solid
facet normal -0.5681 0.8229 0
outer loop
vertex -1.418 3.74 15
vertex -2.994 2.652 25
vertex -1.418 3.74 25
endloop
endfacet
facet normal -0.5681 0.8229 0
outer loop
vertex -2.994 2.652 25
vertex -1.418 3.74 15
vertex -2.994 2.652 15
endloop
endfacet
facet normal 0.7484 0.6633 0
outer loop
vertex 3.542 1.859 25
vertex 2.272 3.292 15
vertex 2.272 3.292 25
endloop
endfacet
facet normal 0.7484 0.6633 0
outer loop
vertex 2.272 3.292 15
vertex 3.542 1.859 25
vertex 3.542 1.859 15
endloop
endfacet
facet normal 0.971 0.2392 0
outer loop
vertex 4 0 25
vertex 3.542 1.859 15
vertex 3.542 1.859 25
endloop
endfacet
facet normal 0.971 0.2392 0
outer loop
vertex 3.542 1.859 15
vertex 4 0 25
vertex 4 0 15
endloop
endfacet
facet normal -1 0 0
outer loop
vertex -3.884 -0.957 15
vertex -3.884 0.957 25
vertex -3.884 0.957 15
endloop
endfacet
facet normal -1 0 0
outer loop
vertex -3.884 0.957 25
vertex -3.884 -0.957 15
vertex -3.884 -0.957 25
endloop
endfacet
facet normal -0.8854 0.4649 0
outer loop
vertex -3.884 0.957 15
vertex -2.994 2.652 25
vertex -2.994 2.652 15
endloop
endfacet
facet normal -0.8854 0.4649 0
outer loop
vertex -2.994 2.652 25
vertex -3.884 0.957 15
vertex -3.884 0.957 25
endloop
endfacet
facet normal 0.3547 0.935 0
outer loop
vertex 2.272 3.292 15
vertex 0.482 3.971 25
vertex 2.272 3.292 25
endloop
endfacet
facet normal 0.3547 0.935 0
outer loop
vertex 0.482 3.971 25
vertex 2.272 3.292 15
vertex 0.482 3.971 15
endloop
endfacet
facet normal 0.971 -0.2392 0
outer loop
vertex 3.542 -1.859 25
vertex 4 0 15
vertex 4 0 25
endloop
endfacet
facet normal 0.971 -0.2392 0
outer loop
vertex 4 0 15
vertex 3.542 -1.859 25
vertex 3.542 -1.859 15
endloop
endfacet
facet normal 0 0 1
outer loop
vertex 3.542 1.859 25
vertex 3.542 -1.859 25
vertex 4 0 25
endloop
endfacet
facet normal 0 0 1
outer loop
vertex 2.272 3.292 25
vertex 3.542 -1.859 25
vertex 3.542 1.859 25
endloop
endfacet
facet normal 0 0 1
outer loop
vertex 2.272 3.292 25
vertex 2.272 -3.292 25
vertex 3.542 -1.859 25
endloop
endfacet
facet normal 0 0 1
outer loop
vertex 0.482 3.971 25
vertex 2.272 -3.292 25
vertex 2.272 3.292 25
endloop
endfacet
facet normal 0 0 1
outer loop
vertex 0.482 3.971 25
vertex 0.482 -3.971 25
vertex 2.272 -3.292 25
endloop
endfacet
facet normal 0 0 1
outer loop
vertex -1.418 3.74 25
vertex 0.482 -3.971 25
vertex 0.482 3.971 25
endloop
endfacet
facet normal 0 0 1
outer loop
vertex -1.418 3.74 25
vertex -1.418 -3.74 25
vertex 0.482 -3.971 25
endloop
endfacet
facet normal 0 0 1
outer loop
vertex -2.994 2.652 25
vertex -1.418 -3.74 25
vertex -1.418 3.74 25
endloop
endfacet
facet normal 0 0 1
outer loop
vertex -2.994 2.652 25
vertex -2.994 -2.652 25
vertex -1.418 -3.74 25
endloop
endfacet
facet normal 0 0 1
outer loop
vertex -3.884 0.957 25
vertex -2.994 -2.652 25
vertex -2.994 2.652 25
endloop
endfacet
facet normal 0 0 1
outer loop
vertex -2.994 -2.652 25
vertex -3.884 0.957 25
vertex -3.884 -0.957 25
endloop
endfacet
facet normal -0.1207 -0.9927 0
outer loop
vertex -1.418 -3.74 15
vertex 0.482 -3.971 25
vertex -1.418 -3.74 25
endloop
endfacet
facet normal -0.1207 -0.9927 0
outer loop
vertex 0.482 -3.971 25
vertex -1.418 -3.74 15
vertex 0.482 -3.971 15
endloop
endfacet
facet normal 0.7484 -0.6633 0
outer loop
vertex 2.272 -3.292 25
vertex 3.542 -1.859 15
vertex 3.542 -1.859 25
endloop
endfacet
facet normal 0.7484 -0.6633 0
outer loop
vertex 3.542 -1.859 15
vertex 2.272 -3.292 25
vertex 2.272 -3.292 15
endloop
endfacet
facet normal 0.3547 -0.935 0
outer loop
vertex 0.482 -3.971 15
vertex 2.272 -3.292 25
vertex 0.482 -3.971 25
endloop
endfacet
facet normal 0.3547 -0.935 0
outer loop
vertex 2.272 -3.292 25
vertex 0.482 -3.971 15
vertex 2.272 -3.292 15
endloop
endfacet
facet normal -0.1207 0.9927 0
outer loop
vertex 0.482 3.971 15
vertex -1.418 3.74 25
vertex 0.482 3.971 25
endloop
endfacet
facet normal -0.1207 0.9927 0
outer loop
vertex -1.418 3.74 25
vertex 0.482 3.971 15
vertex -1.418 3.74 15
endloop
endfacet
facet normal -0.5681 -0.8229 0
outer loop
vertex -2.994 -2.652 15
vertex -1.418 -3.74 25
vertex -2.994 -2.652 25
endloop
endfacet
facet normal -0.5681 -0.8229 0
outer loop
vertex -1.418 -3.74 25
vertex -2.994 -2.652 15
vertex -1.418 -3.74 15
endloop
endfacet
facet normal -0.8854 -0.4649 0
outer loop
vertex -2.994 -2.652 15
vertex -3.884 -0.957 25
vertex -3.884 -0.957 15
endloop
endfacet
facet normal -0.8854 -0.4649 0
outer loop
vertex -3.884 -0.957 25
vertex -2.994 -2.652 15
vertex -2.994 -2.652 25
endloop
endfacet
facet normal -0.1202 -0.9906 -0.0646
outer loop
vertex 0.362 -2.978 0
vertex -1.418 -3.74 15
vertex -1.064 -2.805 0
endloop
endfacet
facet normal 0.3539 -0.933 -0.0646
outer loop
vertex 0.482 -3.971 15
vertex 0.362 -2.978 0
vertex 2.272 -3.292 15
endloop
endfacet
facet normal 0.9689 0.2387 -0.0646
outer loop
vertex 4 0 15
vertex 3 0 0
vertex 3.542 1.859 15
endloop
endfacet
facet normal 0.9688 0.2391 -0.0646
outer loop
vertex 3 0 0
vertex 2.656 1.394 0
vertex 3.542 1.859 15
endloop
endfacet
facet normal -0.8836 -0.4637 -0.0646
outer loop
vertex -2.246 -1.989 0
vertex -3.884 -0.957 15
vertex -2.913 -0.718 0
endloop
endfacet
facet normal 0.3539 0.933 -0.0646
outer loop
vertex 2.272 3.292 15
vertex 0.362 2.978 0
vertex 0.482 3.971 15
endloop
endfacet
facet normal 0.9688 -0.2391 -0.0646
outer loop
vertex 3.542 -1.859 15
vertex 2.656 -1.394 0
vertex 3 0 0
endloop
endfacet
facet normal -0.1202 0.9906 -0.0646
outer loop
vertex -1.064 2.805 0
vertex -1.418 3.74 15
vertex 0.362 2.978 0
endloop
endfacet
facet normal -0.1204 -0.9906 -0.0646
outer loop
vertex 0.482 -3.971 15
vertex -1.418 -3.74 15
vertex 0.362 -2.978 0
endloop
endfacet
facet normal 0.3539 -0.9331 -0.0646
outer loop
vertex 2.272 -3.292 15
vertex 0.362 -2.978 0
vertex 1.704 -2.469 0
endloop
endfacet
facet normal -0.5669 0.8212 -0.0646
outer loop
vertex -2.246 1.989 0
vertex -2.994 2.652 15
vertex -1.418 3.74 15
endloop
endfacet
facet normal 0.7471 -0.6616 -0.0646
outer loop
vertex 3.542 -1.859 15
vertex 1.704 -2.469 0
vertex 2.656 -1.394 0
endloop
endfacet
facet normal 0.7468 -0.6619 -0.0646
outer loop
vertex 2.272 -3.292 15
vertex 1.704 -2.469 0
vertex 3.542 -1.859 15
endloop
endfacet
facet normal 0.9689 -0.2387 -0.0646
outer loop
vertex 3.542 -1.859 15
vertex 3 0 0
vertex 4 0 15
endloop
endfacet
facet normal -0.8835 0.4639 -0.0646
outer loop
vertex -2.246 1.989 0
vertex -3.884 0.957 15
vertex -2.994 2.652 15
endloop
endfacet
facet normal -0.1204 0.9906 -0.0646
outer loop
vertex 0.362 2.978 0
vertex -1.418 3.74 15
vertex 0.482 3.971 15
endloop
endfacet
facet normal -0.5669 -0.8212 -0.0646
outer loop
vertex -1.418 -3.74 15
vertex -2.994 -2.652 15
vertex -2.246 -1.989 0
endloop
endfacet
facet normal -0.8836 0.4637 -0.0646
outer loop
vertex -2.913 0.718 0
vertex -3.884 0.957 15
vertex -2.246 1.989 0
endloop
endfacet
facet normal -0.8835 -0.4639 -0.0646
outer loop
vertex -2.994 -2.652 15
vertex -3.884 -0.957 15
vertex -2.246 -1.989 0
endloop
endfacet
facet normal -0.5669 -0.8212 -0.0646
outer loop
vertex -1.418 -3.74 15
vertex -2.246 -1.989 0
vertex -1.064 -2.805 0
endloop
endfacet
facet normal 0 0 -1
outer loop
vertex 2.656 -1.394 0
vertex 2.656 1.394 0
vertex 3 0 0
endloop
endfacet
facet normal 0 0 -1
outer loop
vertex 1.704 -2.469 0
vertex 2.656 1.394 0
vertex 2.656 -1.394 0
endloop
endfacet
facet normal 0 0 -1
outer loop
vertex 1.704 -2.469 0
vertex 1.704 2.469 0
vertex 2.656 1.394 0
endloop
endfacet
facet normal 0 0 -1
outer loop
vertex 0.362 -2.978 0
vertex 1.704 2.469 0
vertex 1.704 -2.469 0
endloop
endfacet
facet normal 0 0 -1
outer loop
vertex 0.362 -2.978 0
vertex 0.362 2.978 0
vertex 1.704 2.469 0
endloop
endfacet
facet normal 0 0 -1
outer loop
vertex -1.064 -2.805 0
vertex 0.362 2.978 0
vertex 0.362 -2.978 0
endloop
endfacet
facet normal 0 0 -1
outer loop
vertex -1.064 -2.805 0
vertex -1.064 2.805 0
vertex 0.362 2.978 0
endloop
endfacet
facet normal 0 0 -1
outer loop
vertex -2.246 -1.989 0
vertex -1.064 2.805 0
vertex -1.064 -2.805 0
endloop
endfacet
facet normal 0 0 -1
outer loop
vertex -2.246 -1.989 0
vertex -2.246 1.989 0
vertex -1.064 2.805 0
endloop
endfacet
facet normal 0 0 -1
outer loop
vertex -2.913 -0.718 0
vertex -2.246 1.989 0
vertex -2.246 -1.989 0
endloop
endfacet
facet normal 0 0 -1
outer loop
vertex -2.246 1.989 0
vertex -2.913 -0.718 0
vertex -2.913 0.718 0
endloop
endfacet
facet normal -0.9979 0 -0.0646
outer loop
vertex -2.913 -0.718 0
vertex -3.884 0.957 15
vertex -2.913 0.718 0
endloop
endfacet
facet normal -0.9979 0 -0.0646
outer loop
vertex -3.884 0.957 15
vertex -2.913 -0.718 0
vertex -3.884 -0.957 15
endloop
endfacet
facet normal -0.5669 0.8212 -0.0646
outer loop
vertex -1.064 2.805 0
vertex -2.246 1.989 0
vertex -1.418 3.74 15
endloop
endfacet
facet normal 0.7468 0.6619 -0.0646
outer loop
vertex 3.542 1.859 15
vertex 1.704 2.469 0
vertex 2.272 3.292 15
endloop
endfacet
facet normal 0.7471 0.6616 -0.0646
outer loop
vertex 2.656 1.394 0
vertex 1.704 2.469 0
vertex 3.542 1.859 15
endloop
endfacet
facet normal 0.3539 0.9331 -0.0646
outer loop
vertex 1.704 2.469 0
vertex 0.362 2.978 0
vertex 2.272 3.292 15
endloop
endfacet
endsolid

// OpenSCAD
module pressure_pin(length, d_tip, b_base=8, thread=2.5, shaft_length = 10) {
    tip_length = length-shaft_length;
    
    difference() {
    union() {
        translate([0,0,tip_length+shaft_length/2])cylinder(h=shaft_length, d=b_base, center=true);
        translate([0,0,tip_length/2])cylinder(h=length-shaft_length, d2=b_base, d1=d_tip, center=true);
    };
    
    depth = length-shaft_length;
    translate([0,0,-depth/2])cylinder(d=thread, h=shaft_length, center=true);
    };  
};

pressure_pin(length=25, d_tip=6, b_base=8, thread=2.5);
